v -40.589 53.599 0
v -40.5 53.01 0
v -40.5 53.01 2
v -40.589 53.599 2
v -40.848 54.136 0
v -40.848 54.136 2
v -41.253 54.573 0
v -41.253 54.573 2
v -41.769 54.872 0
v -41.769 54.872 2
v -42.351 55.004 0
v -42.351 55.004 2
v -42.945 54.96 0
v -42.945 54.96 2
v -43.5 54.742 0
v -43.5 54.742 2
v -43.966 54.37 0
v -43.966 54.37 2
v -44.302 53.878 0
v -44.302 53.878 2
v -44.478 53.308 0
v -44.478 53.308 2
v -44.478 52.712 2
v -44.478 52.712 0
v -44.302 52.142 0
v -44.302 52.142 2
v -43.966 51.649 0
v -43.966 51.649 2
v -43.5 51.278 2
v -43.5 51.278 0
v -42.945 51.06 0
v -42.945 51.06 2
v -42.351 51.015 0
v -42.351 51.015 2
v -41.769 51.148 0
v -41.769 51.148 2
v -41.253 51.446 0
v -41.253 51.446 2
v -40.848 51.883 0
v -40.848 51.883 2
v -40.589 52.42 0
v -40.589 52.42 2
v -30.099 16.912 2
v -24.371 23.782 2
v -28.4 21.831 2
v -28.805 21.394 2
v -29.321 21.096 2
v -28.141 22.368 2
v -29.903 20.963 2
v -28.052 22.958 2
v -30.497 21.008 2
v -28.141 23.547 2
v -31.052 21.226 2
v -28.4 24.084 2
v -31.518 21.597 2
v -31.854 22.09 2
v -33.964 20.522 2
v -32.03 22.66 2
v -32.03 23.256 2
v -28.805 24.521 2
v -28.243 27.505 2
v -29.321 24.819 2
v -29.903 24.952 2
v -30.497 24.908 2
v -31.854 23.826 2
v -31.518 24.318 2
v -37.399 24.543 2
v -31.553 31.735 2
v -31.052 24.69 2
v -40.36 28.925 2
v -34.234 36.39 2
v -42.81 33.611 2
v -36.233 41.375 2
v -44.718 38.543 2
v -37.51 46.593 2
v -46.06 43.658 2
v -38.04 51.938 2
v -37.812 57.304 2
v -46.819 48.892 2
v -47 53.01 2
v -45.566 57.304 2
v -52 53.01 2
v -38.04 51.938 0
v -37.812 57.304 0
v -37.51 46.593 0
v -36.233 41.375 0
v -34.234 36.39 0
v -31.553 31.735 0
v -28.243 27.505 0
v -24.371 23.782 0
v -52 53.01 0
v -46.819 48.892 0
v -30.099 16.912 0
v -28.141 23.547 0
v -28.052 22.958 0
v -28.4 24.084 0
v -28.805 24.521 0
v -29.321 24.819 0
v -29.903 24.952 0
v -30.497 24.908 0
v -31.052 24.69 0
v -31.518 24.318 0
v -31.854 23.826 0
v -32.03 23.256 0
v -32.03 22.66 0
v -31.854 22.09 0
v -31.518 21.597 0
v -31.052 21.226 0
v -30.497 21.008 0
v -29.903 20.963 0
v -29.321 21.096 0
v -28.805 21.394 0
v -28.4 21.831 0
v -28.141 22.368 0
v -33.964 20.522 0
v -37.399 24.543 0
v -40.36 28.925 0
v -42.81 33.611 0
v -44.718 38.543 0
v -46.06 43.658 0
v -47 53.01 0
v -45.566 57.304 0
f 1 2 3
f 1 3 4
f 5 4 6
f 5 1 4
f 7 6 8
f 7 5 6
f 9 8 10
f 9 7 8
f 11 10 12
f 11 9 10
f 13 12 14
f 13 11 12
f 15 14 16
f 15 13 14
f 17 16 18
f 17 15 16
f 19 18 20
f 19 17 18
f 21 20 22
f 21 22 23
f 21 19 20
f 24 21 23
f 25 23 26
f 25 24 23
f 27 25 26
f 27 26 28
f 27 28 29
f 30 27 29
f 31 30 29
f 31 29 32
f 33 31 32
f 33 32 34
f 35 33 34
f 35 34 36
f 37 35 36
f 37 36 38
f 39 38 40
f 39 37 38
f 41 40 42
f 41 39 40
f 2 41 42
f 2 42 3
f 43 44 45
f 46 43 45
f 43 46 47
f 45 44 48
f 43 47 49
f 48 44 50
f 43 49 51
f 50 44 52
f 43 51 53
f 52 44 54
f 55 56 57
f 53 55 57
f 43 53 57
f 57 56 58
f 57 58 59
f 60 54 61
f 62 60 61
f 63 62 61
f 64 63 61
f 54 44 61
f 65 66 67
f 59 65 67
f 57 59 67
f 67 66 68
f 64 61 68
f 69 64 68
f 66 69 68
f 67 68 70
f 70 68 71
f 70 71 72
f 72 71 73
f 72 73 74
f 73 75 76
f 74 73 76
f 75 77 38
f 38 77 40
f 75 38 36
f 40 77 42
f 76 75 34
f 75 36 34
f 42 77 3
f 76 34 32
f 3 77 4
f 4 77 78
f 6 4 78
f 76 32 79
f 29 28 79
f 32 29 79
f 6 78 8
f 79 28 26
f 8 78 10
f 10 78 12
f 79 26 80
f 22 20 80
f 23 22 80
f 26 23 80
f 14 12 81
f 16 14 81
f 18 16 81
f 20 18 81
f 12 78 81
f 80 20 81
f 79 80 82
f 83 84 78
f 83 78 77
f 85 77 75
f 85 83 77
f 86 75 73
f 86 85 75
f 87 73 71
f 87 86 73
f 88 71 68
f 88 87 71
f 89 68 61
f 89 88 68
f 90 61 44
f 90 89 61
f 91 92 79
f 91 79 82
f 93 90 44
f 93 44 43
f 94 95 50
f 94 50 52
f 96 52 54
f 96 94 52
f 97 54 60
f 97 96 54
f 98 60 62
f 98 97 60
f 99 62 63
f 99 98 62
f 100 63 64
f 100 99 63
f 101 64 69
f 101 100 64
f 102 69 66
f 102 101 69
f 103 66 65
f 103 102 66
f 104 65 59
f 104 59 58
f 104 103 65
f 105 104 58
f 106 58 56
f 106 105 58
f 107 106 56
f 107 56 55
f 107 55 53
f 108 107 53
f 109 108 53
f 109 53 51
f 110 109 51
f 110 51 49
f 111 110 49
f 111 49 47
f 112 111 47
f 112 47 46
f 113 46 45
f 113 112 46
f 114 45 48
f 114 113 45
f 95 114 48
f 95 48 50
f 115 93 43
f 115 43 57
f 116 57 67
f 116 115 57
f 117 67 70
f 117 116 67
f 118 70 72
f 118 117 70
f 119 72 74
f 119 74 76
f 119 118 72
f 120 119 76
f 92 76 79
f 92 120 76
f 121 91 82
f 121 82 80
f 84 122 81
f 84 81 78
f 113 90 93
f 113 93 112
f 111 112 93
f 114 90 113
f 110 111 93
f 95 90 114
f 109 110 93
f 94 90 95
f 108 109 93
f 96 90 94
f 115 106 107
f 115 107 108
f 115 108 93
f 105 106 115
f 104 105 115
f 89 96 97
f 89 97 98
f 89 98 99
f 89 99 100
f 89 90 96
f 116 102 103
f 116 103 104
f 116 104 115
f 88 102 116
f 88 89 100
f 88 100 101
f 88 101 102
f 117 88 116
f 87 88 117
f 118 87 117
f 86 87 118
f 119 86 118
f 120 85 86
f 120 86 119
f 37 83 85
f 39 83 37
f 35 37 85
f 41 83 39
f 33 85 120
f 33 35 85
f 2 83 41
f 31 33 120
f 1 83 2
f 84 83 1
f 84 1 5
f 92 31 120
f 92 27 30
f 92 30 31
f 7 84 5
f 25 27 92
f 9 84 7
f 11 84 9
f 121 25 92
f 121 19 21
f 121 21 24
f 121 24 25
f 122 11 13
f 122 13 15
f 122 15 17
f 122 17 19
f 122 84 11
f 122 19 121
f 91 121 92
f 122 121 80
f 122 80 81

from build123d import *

# Parameters (mm, degrees)
SKETCH_3_R      = 2
EXTRUDE_1_DEPTH = 2


with BuildPart() as part:
    # 草图3 → 凸台-拉伸1 (new body)
    with BuildSketch(Plane.XY):
        with BuildLine():
            Line((-24.370679003, 23.782446214), (-30.099281566, 16.91223147))
            ThreePointArc((-30.099281566, 16.91223147), (-41.650836745, 31.233470531), (-46.819267976, 48.891999177))
            Line((-46.819267976, 48.891999177), (-52, 53.009783315))
            Line((-52, 53.009783315), (-47, 53.009783315))
            Line((-47, 53.009783315), (-45.565810046, 57.304305059))
            Line((-45.565810046, 57.304305059), (-37.81169544, 57.304305059))
            ThreePointArc((-37.81169544, 57.304305059), (-35.321249666, 38.8472782), (-24.370679003, 23.782446214))
        make_face()
        with Locations((-30.0520382, 22.957745114)):
            Circle(SKETCH_3_R, mode=Mode.SUBTRACT)
        with Locations((-42.5, 53.009783315)):
            Circle(SKETCH_3_R, mode=Mode.SUBTRACT)
    extrude(amount=EXTRUDE_1_DEPTH)


solid = part.part
